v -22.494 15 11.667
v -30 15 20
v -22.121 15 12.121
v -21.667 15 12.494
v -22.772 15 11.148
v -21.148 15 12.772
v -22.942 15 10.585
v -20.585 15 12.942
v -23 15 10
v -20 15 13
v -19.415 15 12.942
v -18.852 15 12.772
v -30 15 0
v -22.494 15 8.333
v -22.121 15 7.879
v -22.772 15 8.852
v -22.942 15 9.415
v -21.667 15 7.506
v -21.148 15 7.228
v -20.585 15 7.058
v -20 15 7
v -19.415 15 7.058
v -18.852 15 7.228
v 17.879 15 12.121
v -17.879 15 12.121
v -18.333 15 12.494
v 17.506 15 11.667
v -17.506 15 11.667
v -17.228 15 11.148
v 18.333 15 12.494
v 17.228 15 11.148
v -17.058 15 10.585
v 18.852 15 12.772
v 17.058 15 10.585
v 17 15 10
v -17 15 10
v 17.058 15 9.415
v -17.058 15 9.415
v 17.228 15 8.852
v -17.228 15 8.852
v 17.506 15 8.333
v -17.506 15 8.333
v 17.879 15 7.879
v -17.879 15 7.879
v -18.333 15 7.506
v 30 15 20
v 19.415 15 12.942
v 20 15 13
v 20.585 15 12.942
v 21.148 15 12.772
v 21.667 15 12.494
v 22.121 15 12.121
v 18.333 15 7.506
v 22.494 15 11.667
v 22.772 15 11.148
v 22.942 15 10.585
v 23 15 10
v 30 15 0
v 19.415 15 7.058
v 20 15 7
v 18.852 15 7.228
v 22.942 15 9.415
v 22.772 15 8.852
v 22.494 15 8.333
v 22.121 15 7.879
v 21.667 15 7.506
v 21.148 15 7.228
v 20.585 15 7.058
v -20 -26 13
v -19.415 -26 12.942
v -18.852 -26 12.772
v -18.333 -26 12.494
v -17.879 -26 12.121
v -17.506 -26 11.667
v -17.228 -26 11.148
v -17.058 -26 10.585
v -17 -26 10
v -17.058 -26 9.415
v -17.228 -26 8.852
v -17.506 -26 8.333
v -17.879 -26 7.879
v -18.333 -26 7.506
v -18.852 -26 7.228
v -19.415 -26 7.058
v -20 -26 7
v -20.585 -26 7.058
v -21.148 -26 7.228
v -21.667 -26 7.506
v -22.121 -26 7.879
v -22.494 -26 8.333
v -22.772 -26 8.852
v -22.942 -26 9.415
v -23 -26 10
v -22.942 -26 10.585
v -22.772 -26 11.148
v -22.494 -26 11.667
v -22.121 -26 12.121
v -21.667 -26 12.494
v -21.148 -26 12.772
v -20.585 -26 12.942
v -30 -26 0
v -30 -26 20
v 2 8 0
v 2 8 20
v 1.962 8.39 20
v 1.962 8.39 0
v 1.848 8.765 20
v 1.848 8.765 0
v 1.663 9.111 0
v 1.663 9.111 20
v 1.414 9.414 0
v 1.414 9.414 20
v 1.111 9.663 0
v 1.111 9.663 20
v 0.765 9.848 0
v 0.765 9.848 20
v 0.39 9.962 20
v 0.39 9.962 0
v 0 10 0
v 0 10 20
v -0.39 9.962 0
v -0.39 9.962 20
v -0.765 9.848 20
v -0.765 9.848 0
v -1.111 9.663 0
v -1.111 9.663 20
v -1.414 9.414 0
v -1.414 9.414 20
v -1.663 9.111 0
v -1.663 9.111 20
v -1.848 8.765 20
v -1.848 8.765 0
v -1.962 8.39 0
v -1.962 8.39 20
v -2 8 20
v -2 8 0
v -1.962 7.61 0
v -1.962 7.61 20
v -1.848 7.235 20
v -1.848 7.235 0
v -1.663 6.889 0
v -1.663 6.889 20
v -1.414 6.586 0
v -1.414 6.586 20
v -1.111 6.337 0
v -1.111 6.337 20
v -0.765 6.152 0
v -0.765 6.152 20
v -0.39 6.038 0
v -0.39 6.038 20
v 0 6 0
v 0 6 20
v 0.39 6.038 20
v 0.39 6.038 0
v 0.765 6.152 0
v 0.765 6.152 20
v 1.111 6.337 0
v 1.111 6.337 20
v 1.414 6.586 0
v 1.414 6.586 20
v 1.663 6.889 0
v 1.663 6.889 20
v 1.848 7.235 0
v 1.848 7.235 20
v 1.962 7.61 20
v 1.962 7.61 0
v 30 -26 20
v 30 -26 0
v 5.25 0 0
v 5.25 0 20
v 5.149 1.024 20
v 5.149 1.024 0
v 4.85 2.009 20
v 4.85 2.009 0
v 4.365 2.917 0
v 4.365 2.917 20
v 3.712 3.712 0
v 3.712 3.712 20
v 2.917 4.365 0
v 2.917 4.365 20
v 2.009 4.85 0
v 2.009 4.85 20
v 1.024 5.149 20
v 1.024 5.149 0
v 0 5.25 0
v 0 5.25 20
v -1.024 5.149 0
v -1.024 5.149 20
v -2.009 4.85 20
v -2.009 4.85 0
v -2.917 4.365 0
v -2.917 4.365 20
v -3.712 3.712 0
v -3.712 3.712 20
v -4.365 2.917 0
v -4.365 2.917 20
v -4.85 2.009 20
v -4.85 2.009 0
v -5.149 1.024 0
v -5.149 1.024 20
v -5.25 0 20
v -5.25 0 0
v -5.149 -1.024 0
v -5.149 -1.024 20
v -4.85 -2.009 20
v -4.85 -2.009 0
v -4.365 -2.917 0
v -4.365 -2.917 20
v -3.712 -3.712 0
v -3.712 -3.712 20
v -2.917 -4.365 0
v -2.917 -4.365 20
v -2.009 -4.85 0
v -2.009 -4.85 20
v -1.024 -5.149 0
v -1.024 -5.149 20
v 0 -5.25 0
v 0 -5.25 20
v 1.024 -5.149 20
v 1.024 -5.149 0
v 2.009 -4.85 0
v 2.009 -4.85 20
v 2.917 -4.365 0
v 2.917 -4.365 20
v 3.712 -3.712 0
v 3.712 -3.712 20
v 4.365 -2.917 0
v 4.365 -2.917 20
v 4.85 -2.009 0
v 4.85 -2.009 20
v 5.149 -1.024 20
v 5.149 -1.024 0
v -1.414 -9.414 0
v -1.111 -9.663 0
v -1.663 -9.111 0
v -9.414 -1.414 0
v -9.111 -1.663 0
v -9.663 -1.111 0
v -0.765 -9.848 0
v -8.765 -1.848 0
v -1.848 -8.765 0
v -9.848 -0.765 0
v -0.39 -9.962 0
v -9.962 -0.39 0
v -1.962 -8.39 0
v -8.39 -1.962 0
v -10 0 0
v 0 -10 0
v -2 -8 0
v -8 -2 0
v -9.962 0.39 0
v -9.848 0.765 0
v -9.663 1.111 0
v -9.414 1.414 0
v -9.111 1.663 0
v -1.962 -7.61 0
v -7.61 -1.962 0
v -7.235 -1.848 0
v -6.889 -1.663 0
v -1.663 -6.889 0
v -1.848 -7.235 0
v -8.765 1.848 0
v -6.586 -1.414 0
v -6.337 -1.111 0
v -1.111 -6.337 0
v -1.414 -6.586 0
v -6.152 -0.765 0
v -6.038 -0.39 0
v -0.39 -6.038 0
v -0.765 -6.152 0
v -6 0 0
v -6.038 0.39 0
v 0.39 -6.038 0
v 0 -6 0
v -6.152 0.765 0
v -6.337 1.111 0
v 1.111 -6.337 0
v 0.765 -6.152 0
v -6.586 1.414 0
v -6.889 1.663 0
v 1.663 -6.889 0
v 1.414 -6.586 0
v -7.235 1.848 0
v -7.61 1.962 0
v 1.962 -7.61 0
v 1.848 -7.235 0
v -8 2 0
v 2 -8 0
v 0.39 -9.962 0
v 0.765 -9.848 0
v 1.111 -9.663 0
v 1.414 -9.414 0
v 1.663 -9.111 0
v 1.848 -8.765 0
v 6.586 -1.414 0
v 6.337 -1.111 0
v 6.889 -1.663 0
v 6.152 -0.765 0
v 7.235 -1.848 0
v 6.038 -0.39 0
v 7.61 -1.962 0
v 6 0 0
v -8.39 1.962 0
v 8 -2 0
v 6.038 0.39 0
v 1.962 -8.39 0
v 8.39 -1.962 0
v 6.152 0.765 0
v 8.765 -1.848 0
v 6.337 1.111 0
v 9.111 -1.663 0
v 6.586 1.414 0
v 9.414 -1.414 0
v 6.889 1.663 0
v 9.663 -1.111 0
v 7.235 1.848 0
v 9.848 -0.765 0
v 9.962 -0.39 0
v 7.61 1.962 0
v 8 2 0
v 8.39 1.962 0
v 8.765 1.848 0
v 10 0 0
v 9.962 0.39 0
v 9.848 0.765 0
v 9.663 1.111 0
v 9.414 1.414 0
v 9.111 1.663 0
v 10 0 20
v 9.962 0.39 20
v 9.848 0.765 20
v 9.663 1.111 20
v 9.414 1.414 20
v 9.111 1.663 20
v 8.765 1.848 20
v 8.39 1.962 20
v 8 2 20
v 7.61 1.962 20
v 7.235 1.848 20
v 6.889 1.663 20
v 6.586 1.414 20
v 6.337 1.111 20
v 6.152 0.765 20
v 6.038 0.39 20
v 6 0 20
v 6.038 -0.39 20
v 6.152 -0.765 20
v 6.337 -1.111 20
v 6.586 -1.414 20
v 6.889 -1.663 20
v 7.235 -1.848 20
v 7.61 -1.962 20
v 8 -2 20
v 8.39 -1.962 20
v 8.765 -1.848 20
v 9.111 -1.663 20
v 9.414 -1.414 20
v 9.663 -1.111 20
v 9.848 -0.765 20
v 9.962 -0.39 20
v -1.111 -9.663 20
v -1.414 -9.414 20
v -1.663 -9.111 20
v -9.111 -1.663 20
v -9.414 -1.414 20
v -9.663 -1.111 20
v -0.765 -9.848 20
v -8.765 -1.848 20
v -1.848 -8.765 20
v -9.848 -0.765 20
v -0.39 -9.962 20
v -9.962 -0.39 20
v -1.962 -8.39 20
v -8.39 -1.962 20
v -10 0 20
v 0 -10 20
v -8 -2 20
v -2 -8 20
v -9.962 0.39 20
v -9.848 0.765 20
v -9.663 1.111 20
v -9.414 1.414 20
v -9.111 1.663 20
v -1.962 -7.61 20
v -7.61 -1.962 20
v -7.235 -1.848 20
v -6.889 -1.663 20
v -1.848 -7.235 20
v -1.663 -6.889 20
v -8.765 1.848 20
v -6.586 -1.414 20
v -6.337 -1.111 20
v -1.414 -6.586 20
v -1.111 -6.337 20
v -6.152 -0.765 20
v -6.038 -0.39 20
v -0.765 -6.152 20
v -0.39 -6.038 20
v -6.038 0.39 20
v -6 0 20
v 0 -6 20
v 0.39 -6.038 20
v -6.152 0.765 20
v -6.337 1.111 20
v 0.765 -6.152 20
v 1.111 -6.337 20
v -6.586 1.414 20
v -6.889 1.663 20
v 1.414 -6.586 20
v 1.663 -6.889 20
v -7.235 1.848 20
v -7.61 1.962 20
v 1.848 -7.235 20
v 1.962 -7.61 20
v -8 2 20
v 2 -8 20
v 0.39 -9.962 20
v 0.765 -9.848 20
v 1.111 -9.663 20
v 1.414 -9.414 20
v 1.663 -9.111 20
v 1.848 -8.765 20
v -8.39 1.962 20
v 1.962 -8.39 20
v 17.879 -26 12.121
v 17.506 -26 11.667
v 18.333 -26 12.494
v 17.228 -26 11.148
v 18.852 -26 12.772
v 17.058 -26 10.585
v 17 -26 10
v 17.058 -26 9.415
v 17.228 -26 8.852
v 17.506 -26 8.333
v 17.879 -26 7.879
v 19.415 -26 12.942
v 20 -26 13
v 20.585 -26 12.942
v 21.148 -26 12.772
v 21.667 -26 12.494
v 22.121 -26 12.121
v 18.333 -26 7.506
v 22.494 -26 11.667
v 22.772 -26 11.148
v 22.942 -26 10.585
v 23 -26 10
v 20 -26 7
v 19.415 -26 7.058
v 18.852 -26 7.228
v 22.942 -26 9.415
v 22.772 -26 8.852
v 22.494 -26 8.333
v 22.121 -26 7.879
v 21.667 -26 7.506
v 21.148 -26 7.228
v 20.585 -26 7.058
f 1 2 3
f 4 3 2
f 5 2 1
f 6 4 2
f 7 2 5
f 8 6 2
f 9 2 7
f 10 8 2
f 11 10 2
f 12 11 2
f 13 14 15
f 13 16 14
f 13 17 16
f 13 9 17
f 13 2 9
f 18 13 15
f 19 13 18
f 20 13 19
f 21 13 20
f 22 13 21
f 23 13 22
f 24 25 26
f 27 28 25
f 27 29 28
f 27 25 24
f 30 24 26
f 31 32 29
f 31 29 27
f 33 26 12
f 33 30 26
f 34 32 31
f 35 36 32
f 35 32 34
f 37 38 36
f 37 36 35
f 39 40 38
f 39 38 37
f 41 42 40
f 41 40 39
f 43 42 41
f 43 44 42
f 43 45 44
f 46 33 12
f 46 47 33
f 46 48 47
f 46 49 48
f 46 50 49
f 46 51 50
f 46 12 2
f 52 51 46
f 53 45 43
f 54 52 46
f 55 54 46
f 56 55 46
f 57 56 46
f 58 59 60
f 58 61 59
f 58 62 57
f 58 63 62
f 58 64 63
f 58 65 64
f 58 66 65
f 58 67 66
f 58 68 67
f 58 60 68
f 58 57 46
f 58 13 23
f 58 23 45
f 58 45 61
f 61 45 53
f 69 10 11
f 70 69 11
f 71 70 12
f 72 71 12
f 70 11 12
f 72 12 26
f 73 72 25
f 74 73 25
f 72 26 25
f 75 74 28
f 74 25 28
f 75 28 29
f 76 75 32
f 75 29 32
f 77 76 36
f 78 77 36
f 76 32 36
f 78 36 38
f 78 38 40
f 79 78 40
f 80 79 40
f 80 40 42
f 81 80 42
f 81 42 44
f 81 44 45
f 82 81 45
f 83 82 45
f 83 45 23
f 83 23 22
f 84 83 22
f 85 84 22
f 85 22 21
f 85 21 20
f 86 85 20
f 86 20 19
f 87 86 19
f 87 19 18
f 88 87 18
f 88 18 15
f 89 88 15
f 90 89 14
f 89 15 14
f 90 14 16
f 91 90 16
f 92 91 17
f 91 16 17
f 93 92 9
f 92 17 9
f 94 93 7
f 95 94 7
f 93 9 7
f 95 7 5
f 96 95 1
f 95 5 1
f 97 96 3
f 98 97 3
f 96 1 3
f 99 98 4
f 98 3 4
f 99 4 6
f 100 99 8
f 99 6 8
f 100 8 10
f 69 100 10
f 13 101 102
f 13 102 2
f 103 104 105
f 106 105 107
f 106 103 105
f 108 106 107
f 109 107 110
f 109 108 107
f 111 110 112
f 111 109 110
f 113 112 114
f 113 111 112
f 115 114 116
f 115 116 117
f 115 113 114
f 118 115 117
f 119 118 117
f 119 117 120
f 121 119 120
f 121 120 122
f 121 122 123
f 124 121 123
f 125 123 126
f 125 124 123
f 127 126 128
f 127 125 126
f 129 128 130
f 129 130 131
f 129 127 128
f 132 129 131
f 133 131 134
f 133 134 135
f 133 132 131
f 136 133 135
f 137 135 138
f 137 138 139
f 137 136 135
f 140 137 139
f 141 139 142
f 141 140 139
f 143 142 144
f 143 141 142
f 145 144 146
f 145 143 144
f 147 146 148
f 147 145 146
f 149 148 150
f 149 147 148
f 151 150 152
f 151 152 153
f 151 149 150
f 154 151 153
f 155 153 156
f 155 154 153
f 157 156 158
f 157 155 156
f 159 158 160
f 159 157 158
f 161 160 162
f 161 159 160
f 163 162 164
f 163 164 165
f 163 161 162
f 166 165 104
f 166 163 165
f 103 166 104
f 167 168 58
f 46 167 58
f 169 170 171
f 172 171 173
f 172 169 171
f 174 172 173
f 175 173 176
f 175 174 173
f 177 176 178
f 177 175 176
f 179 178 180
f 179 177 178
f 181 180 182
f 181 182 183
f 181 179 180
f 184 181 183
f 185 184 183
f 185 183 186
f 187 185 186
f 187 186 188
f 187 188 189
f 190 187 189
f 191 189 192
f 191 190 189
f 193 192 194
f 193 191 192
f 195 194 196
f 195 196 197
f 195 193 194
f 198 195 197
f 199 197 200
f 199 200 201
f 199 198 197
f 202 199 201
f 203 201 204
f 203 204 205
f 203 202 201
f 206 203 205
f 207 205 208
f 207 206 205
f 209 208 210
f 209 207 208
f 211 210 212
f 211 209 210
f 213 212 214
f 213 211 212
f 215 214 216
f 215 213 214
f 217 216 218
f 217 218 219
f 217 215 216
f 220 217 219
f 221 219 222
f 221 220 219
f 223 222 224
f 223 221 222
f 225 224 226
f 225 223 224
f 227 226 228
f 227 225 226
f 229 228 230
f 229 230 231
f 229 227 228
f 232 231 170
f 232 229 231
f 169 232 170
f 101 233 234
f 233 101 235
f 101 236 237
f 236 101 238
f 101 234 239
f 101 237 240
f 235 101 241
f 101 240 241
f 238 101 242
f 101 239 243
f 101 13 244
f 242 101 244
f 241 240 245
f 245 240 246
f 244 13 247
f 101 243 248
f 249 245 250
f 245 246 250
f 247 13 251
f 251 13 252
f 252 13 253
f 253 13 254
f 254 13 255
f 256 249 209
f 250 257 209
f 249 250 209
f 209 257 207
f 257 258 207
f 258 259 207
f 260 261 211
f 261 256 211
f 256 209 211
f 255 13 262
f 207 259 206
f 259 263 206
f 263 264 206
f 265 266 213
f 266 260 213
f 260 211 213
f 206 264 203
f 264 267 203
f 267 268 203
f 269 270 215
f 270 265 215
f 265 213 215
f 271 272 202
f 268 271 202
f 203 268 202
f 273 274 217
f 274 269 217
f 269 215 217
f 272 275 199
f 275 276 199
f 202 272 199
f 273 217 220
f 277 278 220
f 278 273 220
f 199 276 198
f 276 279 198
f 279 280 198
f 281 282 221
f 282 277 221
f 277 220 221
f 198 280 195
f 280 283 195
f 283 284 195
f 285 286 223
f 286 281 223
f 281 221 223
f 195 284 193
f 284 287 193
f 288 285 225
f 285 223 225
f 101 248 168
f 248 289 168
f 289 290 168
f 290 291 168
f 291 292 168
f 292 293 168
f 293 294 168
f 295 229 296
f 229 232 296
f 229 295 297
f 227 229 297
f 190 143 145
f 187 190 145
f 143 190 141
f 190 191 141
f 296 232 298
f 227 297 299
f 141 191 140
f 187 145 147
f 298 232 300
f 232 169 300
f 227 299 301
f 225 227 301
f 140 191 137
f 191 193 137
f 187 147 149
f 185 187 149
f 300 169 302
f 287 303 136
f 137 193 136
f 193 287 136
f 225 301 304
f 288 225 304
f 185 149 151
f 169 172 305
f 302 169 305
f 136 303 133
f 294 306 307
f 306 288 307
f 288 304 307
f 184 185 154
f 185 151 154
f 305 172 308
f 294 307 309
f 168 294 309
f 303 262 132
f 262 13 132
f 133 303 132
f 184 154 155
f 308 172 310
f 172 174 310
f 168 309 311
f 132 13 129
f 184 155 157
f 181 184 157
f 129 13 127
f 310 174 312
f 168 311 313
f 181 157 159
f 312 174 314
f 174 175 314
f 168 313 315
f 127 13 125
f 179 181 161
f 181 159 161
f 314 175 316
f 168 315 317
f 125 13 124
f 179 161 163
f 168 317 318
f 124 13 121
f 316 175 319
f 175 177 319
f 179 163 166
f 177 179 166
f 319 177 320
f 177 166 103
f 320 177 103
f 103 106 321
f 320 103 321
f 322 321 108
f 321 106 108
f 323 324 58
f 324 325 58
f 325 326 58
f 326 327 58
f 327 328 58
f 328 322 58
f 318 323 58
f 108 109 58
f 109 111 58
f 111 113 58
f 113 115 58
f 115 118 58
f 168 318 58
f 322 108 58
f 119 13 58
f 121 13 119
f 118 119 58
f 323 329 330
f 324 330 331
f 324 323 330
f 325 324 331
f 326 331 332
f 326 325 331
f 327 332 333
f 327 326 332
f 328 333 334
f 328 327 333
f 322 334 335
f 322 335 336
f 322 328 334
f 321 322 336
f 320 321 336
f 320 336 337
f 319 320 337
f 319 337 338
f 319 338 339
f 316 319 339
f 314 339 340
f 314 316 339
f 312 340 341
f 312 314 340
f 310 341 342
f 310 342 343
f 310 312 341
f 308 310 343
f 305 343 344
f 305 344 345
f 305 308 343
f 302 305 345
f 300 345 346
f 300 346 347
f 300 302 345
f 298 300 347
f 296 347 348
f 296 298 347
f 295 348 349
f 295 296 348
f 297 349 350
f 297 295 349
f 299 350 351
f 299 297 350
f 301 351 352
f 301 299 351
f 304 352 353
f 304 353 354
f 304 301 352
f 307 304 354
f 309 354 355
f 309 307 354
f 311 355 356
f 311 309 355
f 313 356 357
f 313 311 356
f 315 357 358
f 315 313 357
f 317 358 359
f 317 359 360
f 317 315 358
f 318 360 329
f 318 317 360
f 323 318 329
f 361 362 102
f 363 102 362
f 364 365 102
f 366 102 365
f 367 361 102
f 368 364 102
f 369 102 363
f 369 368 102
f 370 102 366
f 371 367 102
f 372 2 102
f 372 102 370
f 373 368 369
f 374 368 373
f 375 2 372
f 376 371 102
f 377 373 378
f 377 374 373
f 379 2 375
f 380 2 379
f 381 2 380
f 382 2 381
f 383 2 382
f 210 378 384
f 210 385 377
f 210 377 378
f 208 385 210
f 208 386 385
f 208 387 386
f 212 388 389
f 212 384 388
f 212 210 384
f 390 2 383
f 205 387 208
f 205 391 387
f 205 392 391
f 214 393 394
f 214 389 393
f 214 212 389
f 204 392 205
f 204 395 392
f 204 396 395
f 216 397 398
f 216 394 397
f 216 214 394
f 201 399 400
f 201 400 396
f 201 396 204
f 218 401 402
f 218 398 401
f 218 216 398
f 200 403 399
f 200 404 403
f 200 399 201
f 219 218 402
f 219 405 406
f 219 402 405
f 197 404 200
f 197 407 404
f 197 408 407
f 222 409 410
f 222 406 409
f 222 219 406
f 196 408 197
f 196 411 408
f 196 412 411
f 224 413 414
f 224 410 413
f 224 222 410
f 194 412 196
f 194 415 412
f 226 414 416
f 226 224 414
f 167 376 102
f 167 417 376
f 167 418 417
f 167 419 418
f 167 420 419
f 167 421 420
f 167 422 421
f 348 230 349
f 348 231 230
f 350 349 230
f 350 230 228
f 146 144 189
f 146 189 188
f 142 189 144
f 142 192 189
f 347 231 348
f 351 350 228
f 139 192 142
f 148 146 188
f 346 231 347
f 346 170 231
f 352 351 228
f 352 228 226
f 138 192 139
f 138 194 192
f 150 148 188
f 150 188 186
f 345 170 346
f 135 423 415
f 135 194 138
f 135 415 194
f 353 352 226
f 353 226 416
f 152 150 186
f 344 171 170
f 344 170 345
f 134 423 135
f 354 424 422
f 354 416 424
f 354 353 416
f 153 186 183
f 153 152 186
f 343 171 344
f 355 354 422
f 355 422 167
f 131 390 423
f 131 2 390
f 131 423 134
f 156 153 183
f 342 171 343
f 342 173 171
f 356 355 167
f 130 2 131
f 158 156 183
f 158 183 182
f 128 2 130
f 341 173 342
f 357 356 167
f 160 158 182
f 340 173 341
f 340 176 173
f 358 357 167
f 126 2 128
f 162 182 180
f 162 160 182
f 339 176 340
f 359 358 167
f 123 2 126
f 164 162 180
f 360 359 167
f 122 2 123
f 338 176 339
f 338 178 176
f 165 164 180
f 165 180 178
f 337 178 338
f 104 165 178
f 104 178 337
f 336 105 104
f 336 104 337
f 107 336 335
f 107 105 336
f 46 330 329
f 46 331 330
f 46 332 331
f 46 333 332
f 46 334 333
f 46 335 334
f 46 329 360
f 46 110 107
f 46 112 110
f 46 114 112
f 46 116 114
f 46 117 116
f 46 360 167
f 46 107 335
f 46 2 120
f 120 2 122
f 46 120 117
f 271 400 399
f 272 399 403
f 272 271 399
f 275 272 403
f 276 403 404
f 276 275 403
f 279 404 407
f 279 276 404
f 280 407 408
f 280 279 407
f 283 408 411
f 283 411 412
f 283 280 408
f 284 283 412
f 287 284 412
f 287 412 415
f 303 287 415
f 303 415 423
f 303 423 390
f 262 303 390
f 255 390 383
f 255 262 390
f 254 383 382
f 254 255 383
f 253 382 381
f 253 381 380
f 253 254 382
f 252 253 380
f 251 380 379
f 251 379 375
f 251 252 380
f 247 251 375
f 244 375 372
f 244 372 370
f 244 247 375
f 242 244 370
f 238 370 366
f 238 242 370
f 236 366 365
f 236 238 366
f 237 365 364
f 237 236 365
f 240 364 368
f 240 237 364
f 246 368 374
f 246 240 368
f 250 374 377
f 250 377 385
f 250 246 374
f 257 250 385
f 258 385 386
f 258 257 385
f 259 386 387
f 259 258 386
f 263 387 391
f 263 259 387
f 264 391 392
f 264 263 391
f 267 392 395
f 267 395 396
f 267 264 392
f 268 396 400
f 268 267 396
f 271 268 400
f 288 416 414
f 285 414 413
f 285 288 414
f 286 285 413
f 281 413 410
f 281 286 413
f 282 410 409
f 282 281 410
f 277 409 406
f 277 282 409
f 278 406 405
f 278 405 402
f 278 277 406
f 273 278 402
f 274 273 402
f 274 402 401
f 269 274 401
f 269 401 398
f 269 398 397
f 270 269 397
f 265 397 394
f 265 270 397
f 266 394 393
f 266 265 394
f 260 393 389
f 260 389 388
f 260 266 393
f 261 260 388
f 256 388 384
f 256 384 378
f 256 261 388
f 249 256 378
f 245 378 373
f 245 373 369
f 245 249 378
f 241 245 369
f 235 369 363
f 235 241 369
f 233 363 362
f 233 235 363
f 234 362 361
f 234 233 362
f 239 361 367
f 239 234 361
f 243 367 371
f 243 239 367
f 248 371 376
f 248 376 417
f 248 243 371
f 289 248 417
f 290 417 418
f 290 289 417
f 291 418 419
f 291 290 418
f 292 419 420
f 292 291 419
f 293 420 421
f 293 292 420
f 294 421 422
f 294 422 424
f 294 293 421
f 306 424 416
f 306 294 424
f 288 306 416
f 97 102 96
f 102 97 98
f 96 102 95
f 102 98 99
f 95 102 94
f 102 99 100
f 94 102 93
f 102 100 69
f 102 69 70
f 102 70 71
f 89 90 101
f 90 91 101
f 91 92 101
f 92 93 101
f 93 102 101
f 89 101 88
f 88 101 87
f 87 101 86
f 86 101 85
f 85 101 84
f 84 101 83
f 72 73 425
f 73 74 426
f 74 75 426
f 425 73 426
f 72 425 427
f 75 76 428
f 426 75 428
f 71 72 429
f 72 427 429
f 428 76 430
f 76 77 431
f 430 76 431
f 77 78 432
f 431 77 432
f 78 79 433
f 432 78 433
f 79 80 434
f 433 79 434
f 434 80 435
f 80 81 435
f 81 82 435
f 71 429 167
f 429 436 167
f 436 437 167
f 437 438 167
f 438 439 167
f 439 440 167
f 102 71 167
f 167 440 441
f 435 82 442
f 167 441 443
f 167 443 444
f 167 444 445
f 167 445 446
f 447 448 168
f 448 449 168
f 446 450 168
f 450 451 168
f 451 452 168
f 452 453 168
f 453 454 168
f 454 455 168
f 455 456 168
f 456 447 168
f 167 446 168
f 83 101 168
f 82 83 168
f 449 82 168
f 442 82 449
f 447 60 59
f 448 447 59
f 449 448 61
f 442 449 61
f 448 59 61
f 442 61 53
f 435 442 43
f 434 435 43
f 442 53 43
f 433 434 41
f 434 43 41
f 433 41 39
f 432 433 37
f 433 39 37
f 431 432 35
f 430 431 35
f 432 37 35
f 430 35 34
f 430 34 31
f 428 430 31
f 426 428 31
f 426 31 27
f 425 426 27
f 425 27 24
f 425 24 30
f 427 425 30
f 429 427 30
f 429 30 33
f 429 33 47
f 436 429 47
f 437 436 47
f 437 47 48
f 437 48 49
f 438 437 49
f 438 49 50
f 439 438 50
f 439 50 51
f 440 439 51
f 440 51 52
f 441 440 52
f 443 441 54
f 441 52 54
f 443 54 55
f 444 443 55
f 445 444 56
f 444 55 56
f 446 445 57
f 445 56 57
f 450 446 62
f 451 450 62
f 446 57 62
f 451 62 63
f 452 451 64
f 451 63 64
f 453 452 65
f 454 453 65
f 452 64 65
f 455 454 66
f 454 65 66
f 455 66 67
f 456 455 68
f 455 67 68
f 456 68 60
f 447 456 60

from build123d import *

# Parameters (mm, degrees)
SKETCH1_W           = 60
SKETCH1_H           = 41
SKETCH1_R           = 5.25
SKETCH1_R_2         = 2
BOSS_EXTRUDE1_DEPTH = 20
SKETCH2_R           = 3
CUT_EXTRUDE1_DEPTH  = 55.598534779


with BuildPart() as part:
    # Sketch1 → Boss-Extrude1 (new body)
    with BuildSketch(Plane.XY):
        with Locations((0, -5.5)):
            Rectangle(SKETCH1_W, SKETCH1_H)
        Circle(SKETCH1_R, mode=Mode.SUBTRACT)
        with Locations((0, 8)):
            Circle(SKETCH1_R_2, mode=Mode.SUBTRACT)
        with Locations((8, 0)):
            Circle(SKETCH1_R_2, mode=Mode.SUBTRACT)
        with Locations((0, -8)):
            Circle(SKETCH1_R_2, mode=Mode.SUBTRACT)
        with Locations((-8, 0)):
            Circle(SKETCH1_R_2, mode=Mode.SUBTRACT)
    extrude(amount=BOSS_EXTRUDE1_DEPTH)

    # Sketch2 → Cut-Extrude1 (cut, through all)
    with BuildSketch(Plane(origin=(0, 15, 0), x_dir=(1, 0, 0), z_dir=(0, 1, 0))):
        with Locations(Location((-20, -10, 0), (0, 0, 270))):
            Circle(SKETCH2_R)
        with Locations(Location((20, -10, 0), (0, 0, 90))):
            Circle(SKETCH2_R)
    extrude(amount=-CUT_EXTRUDE1_DEPTH, mode=Mode.SUBTRACT)


solid = part.part
